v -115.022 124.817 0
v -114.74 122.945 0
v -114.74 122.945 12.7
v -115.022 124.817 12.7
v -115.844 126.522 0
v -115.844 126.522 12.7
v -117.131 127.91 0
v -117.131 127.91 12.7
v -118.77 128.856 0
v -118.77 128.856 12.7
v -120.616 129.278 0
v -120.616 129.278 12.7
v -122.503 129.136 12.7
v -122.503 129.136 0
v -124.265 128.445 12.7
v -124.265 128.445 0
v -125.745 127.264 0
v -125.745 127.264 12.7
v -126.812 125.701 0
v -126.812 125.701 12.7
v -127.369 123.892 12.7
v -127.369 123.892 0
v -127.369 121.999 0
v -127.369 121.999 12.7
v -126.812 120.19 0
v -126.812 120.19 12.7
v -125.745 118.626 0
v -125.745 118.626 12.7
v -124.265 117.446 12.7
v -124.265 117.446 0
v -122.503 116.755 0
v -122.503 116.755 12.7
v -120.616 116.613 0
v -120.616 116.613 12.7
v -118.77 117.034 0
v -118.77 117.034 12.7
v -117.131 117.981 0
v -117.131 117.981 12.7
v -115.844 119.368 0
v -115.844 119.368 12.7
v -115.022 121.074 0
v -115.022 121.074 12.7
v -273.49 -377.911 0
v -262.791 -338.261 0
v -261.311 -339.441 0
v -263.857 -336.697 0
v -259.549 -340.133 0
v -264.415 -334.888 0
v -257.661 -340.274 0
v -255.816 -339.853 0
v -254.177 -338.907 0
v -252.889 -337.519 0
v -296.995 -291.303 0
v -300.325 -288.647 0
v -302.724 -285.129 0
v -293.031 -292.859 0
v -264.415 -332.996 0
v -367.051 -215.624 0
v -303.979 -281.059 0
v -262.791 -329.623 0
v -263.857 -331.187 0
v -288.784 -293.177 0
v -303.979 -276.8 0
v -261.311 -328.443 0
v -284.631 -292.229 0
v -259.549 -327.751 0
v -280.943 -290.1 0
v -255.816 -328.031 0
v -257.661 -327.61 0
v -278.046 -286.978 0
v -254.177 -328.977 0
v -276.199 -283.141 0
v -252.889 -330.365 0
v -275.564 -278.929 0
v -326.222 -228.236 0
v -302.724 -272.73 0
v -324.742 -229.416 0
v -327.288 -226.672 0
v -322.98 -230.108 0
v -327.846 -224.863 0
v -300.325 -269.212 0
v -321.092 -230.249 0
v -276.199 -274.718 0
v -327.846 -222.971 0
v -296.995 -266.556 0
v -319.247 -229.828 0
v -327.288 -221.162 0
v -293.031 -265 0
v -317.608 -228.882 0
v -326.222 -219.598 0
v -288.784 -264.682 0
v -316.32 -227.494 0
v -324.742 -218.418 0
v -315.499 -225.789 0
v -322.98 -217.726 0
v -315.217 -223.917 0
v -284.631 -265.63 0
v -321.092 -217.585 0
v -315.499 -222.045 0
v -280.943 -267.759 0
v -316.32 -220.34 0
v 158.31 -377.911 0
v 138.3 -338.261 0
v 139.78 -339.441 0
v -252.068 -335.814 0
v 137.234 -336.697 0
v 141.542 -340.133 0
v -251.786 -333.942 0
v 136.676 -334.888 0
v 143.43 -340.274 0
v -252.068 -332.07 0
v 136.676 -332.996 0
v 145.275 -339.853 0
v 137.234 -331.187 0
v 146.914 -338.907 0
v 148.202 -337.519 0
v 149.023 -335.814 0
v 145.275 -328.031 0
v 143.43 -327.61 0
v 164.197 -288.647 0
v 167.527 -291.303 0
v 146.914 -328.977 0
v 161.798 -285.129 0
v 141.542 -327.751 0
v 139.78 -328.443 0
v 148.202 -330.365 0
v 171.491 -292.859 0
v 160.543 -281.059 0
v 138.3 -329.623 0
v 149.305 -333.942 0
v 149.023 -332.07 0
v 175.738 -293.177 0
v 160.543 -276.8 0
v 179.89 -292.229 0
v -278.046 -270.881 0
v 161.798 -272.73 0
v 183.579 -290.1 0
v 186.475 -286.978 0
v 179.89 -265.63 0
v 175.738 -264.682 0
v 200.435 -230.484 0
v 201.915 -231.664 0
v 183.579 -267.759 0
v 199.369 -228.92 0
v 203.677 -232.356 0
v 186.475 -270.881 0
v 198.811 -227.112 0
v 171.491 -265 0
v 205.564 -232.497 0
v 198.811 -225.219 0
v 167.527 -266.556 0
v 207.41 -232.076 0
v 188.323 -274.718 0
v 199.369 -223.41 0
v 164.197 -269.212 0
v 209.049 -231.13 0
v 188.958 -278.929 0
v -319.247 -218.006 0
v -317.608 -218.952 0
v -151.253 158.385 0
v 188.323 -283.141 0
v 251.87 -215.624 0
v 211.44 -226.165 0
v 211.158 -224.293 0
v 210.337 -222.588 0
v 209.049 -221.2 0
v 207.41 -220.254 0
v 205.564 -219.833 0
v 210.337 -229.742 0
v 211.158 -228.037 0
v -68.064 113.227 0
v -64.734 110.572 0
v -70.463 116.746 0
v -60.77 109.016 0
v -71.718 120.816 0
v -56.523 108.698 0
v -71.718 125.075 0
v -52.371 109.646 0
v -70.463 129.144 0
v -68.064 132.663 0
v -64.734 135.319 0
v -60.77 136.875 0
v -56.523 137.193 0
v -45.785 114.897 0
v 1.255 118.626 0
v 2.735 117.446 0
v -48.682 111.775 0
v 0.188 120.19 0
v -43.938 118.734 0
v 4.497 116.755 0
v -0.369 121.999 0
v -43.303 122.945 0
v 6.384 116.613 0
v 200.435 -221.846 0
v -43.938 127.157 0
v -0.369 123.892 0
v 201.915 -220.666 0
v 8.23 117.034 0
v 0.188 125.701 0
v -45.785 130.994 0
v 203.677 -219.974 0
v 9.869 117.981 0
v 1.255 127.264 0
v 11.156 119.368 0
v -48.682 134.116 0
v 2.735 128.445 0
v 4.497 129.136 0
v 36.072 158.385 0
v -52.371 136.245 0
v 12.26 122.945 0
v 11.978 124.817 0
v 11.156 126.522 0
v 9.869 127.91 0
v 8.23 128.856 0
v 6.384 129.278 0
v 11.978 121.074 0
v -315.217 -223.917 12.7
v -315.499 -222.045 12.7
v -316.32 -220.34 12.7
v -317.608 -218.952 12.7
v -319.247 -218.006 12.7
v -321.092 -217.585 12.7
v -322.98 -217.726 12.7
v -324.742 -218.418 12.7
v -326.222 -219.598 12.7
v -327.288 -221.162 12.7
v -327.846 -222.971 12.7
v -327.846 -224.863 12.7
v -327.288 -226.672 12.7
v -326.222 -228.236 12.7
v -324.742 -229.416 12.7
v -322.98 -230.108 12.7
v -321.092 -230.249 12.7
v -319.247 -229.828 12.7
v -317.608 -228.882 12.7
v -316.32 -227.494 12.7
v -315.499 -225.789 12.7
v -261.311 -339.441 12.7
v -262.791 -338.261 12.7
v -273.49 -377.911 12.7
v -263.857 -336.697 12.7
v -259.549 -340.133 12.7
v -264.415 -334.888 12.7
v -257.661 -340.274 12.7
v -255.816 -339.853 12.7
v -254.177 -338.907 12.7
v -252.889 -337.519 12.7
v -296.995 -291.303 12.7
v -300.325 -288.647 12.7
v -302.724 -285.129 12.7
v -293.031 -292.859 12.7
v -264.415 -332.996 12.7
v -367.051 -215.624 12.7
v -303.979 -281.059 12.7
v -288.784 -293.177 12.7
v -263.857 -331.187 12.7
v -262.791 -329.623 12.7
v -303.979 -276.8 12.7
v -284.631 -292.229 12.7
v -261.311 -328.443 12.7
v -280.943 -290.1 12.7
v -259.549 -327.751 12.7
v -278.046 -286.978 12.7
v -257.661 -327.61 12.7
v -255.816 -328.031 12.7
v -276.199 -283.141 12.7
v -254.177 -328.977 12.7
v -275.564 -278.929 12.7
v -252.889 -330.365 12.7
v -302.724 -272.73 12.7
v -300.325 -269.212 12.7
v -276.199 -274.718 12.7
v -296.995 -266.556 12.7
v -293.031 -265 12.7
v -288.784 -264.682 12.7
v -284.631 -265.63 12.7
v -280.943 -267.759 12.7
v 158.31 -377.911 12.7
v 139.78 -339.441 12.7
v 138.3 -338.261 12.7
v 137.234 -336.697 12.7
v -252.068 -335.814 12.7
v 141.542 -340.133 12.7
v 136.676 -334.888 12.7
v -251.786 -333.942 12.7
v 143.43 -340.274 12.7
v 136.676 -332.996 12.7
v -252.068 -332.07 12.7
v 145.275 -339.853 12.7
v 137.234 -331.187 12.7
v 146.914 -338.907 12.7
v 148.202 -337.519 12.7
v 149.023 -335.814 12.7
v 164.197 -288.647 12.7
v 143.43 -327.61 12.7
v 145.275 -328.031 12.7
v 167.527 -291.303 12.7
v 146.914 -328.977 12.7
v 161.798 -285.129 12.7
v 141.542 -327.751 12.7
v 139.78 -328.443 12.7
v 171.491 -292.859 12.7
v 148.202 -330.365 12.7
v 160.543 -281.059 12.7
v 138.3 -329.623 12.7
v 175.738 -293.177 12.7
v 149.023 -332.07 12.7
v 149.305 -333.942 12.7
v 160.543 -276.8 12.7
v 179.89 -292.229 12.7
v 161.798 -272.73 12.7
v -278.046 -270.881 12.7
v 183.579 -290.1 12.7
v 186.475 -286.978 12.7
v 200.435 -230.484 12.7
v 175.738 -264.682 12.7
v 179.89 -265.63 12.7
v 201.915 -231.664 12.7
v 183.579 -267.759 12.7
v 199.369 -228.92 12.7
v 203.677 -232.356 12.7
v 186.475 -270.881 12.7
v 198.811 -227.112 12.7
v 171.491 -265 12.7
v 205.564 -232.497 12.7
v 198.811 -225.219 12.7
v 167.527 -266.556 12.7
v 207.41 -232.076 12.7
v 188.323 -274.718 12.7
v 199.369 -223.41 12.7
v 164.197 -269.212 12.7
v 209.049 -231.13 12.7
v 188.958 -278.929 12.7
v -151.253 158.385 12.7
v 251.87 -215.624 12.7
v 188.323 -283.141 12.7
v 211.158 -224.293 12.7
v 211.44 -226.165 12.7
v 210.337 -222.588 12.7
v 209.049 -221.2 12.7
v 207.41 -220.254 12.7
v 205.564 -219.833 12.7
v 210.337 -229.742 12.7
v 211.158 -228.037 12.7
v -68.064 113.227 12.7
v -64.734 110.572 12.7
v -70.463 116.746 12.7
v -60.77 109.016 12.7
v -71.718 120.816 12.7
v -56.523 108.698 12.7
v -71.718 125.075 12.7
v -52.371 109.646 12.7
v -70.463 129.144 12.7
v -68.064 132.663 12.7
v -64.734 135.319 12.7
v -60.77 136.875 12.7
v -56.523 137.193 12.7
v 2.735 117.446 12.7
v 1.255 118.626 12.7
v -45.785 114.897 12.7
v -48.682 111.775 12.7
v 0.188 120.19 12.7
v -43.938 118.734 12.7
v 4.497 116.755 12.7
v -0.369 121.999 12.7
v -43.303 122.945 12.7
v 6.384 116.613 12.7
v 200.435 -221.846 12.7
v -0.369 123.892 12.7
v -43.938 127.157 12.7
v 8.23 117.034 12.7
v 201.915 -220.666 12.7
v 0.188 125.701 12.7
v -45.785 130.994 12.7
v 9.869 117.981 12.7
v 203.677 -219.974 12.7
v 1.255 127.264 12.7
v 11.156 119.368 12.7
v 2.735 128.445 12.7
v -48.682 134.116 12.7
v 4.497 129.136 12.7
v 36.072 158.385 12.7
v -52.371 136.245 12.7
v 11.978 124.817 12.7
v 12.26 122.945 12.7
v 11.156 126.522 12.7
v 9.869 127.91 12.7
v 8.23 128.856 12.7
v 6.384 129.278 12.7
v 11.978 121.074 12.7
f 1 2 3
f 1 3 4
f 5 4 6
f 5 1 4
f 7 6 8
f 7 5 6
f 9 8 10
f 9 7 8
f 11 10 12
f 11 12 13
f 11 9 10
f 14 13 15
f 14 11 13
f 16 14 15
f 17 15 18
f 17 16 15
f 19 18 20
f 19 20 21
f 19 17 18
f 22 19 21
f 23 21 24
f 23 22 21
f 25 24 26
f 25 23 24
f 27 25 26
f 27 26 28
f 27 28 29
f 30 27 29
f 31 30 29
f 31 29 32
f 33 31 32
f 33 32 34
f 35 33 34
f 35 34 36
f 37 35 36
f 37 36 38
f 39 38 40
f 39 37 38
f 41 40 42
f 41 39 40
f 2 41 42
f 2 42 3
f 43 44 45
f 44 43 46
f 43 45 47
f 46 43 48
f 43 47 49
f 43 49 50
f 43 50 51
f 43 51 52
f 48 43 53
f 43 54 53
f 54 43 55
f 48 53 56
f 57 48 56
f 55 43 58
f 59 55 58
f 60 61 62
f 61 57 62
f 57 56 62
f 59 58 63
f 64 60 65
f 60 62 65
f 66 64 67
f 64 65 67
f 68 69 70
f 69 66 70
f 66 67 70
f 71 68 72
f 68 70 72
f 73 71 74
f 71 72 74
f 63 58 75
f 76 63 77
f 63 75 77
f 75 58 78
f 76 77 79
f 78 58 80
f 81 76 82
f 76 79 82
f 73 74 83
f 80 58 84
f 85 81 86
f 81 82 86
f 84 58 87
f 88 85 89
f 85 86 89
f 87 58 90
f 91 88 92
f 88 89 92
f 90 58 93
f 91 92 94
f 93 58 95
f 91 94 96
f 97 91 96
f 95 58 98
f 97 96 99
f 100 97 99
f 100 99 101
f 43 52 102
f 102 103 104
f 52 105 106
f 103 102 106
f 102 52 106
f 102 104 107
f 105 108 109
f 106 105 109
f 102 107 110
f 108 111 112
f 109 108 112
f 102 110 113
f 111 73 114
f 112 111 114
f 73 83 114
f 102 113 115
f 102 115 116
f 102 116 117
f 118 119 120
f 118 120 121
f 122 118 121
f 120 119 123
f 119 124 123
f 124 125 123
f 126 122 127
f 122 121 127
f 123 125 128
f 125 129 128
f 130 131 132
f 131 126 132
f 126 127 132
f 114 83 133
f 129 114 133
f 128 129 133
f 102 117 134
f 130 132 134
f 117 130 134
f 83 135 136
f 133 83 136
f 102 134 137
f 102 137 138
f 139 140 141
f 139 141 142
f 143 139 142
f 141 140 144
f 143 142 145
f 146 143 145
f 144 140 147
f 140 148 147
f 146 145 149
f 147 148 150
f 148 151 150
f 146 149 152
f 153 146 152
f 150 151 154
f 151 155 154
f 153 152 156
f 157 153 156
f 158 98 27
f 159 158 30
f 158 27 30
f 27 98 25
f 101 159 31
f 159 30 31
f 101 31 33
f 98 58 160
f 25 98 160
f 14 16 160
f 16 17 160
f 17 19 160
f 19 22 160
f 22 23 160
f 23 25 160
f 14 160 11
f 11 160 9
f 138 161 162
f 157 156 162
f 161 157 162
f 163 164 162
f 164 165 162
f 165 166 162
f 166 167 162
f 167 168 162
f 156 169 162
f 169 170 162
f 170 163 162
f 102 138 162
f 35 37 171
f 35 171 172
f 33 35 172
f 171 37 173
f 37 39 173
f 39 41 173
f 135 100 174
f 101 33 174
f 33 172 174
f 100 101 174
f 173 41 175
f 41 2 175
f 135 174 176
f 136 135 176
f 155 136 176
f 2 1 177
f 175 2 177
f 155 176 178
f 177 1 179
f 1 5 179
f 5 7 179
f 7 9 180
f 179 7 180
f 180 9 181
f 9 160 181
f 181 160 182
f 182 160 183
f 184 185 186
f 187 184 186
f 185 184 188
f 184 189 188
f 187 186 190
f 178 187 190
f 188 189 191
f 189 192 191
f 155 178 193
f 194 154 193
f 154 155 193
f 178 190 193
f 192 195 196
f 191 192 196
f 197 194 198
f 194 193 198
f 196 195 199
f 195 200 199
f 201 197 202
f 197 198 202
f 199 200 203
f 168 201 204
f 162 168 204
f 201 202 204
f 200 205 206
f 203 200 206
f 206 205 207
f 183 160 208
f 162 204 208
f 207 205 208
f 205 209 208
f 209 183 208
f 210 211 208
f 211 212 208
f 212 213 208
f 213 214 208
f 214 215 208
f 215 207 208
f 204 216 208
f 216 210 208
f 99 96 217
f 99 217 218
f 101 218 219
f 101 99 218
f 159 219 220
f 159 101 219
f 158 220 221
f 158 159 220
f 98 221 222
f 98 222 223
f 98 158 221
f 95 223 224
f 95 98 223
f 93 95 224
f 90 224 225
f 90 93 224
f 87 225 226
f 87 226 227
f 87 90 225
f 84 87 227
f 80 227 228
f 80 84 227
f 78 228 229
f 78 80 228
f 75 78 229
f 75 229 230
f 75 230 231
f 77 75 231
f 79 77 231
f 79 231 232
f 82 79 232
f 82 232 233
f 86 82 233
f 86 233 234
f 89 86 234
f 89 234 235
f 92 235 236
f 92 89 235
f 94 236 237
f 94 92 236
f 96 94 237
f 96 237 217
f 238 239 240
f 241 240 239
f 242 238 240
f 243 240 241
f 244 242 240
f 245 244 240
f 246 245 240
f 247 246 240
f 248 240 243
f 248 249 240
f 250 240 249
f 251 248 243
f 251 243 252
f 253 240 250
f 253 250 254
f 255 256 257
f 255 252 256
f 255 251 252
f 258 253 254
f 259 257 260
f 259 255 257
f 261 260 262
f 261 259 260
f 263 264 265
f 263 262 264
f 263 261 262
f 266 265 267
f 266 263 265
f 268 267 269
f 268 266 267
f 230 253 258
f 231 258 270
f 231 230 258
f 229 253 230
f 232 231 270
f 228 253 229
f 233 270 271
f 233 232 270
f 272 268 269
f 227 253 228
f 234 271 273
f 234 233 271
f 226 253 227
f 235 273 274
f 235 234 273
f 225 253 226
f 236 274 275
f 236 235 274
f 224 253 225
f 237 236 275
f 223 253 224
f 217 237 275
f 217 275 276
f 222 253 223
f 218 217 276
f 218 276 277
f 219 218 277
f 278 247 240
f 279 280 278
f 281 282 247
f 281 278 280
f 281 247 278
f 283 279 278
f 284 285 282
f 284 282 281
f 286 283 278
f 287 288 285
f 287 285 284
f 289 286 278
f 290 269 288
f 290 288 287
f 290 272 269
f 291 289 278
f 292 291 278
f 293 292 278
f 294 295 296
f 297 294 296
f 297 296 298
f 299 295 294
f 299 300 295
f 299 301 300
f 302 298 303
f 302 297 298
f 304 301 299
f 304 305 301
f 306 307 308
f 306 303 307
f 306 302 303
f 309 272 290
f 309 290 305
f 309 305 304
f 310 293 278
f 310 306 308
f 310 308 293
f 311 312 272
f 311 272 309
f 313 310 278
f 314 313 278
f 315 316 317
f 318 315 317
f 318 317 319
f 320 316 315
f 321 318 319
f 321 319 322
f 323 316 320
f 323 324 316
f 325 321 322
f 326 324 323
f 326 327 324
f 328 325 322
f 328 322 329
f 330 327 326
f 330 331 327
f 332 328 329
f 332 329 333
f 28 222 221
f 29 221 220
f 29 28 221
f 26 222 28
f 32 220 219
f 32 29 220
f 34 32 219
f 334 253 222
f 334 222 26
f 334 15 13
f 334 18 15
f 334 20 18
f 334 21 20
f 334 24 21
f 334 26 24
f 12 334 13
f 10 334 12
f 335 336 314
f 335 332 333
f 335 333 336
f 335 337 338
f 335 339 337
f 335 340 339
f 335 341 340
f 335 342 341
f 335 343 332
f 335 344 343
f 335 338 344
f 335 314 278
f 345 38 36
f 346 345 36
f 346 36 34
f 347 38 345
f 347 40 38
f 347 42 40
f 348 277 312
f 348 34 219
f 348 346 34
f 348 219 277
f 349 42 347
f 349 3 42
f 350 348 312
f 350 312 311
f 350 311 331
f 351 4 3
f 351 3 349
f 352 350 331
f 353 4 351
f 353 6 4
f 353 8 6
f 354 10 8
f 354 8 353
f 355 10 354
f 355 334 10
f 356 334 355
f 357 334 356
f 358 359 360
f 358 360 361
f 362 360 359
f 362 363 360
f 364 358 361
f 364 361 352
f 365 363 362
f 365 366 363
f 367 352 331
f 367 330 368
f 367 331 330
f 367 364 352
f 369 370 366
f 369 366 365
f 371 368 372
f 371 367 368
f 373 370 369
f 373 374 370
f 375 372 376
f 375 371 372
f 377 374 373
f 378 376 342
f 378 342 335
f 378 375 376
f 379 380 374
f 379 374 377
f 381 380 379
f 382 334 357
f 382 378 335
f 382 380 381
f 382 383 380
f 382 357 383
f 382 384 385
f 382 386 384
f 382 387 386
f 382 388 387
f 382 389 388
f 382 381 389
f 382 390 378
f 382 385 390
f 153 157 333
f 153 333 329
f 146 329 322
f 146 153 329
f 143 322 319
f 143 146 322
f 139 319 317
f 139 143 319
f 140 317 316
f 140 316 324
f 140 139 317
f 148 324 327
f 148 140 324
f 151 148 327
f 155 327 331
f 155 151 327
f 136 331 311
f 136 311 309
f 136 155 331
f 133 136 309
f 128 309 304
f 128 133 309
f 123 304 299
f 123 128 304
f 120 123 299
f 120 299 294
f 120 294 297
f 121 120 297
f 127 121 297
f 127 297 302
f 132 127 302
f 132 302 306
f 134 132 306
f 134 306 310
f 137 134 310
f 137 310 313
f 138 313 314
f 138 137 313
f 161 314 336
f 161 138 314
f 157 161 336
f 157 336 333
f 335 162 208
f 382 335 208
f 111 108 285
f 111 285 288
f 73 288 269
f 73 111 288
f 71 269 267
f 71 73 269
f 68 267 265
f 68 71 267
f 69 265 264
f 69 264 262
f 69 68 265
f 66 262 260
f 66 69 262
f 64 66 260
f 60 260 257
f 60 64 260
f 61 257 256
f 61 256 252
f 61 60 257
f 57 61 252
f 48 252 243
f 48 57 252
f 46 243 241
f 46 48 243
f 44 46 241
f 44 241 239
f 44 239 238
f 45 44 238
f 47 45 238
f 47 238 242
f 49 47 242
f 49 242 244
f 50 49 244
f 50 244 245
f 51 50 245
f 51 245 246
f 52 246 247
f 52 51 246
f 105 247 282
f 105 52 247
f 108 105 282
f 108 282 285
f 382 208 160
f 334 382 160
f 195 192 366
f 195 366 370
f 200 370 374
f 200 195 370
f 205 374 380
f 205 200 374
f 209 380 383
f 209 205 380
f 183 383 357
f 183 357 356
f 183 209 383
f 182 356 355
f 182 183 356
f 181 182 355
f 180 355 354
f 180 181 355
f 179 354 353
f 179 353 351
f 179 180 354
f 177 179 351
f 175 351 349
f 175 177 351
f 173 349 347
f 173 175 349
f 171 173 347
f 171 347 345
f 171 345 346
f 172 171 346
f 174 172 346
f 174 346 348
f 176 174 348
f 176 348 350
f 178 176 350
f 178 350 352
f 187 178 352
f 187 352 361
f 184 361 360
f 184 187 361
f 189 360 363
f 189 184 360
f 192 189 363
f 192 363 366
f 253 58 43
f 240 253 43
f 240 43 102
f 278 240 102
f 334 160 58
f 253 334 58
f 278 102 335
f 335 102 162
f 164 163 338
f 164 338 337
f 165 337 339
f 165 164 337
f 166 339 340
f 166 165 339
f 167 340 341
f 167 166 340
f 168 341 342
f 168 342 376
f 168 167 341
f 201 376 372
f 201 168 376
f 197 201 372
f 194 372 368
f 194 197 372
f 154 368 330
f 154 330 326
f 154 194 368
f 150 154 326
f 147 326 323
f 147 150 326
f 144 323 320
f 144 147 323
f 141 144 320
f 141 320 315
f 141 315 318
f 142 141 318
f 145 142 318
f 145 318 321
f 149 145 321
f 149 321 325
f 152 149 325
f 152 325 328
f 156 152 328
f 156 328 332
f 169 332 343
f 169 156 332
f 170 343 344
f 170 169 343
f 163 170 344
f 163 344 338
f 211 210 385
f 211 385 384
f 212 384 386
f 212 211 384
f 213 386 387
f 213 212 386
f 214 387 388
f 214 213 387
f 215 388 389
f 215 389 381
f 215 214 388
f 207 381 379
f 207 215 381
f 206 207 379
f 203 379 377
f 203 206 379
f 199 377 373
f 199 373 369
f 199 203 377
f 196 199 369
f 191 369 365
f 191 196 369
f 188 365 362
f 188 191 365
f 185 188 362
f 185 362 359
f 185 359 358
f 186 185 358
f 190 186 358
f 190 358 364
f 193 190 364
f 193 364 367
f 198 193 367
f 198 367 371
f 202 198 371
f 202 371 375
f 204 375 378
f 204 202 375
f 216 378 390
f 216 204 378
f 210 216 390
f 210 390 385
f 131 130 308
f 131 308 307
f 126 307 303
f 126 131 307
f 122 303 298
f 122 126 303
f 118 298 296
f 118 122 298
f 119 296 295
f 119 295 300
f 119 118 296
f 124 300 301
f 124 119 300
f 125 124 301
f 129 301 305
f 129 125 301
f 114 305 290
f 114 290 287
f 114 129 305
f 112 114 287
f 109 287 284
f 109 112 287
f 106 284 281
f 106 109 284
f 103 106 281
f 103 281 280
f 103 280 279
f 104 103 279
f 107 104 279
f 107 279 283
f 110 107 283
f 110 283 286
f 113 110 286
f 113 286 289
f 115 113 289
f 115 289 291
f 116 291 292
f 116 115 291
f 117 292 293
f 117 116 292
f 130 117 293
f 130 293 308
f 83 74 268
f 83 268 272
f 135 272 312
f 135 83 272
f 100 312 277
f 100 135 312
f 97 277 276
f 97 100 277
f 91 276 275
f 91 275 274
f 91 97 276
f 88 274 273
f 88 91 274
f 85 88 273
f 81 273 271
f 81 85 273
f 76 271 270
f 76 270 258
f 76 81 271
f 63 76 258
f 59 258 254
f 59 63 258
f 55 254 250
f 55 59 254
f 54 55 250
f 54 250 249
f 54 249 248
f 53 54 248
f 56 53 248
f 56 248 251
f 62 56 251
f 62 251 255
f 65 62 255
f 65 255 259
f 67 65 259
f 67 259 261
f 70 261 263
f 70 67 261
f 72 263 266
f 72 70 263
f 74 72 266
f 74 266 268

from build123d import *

# Parameters (mm, degrees)
F0_R     = 6.35
F0_R_2   = 14.2875
F1_DEPTH = 12.7


with BuildPart() as f1:
    # F0 (on Top) → F1 (new body)
    with BuildSketch(Plane.XY):
        Polygon((-367.050953, -215.623875), (-273.490369, -377.910882), (158.309631, -377.910882), (251.870214, -215.623875), (36.072131, 158.384718), (-151.252869, 158.384718), align=None)
        with Locations((-258.135842, -333.942033)):
            Circle(F0_R, mode=Mode.SUBTRACT)
        with Locations((-289.851294, -278.929488)):
            Circle(F0_R_2, mode=Mode.SUBTRACT)
        with Locations((-321.566746, -223.916943)):
            Circle(F0_R, mode=Mode.SUBTRACT)
        with Locations((142.955103, -333.942033)):
            Circle(F0_R, mode=Mode.SUBTRACT)
        with Locations((174.670555, -278.929488)):
            Circle(F0_R_2, mode=Mode.SUBTRACT)
        with Locations((205.089922, -226.165088)):
            Circle(F0_R, mode=Mode.SUBTRACT)
        with Locations((-121.090369, 122.945368)):
            Circle(F0_R, mode=Mode.SUBTRACT)
        with Locations((-57.590369, 122.945368)):
            Circle(F0_R_2, mode=Mode.SUBTRACT)
        with Locations((5.909631, 122.945368)):
            Circle(F0_R, mode=Mode.SUBTRACT)
    extrude(amount=F1_DEPTH)


solid = f1.part
